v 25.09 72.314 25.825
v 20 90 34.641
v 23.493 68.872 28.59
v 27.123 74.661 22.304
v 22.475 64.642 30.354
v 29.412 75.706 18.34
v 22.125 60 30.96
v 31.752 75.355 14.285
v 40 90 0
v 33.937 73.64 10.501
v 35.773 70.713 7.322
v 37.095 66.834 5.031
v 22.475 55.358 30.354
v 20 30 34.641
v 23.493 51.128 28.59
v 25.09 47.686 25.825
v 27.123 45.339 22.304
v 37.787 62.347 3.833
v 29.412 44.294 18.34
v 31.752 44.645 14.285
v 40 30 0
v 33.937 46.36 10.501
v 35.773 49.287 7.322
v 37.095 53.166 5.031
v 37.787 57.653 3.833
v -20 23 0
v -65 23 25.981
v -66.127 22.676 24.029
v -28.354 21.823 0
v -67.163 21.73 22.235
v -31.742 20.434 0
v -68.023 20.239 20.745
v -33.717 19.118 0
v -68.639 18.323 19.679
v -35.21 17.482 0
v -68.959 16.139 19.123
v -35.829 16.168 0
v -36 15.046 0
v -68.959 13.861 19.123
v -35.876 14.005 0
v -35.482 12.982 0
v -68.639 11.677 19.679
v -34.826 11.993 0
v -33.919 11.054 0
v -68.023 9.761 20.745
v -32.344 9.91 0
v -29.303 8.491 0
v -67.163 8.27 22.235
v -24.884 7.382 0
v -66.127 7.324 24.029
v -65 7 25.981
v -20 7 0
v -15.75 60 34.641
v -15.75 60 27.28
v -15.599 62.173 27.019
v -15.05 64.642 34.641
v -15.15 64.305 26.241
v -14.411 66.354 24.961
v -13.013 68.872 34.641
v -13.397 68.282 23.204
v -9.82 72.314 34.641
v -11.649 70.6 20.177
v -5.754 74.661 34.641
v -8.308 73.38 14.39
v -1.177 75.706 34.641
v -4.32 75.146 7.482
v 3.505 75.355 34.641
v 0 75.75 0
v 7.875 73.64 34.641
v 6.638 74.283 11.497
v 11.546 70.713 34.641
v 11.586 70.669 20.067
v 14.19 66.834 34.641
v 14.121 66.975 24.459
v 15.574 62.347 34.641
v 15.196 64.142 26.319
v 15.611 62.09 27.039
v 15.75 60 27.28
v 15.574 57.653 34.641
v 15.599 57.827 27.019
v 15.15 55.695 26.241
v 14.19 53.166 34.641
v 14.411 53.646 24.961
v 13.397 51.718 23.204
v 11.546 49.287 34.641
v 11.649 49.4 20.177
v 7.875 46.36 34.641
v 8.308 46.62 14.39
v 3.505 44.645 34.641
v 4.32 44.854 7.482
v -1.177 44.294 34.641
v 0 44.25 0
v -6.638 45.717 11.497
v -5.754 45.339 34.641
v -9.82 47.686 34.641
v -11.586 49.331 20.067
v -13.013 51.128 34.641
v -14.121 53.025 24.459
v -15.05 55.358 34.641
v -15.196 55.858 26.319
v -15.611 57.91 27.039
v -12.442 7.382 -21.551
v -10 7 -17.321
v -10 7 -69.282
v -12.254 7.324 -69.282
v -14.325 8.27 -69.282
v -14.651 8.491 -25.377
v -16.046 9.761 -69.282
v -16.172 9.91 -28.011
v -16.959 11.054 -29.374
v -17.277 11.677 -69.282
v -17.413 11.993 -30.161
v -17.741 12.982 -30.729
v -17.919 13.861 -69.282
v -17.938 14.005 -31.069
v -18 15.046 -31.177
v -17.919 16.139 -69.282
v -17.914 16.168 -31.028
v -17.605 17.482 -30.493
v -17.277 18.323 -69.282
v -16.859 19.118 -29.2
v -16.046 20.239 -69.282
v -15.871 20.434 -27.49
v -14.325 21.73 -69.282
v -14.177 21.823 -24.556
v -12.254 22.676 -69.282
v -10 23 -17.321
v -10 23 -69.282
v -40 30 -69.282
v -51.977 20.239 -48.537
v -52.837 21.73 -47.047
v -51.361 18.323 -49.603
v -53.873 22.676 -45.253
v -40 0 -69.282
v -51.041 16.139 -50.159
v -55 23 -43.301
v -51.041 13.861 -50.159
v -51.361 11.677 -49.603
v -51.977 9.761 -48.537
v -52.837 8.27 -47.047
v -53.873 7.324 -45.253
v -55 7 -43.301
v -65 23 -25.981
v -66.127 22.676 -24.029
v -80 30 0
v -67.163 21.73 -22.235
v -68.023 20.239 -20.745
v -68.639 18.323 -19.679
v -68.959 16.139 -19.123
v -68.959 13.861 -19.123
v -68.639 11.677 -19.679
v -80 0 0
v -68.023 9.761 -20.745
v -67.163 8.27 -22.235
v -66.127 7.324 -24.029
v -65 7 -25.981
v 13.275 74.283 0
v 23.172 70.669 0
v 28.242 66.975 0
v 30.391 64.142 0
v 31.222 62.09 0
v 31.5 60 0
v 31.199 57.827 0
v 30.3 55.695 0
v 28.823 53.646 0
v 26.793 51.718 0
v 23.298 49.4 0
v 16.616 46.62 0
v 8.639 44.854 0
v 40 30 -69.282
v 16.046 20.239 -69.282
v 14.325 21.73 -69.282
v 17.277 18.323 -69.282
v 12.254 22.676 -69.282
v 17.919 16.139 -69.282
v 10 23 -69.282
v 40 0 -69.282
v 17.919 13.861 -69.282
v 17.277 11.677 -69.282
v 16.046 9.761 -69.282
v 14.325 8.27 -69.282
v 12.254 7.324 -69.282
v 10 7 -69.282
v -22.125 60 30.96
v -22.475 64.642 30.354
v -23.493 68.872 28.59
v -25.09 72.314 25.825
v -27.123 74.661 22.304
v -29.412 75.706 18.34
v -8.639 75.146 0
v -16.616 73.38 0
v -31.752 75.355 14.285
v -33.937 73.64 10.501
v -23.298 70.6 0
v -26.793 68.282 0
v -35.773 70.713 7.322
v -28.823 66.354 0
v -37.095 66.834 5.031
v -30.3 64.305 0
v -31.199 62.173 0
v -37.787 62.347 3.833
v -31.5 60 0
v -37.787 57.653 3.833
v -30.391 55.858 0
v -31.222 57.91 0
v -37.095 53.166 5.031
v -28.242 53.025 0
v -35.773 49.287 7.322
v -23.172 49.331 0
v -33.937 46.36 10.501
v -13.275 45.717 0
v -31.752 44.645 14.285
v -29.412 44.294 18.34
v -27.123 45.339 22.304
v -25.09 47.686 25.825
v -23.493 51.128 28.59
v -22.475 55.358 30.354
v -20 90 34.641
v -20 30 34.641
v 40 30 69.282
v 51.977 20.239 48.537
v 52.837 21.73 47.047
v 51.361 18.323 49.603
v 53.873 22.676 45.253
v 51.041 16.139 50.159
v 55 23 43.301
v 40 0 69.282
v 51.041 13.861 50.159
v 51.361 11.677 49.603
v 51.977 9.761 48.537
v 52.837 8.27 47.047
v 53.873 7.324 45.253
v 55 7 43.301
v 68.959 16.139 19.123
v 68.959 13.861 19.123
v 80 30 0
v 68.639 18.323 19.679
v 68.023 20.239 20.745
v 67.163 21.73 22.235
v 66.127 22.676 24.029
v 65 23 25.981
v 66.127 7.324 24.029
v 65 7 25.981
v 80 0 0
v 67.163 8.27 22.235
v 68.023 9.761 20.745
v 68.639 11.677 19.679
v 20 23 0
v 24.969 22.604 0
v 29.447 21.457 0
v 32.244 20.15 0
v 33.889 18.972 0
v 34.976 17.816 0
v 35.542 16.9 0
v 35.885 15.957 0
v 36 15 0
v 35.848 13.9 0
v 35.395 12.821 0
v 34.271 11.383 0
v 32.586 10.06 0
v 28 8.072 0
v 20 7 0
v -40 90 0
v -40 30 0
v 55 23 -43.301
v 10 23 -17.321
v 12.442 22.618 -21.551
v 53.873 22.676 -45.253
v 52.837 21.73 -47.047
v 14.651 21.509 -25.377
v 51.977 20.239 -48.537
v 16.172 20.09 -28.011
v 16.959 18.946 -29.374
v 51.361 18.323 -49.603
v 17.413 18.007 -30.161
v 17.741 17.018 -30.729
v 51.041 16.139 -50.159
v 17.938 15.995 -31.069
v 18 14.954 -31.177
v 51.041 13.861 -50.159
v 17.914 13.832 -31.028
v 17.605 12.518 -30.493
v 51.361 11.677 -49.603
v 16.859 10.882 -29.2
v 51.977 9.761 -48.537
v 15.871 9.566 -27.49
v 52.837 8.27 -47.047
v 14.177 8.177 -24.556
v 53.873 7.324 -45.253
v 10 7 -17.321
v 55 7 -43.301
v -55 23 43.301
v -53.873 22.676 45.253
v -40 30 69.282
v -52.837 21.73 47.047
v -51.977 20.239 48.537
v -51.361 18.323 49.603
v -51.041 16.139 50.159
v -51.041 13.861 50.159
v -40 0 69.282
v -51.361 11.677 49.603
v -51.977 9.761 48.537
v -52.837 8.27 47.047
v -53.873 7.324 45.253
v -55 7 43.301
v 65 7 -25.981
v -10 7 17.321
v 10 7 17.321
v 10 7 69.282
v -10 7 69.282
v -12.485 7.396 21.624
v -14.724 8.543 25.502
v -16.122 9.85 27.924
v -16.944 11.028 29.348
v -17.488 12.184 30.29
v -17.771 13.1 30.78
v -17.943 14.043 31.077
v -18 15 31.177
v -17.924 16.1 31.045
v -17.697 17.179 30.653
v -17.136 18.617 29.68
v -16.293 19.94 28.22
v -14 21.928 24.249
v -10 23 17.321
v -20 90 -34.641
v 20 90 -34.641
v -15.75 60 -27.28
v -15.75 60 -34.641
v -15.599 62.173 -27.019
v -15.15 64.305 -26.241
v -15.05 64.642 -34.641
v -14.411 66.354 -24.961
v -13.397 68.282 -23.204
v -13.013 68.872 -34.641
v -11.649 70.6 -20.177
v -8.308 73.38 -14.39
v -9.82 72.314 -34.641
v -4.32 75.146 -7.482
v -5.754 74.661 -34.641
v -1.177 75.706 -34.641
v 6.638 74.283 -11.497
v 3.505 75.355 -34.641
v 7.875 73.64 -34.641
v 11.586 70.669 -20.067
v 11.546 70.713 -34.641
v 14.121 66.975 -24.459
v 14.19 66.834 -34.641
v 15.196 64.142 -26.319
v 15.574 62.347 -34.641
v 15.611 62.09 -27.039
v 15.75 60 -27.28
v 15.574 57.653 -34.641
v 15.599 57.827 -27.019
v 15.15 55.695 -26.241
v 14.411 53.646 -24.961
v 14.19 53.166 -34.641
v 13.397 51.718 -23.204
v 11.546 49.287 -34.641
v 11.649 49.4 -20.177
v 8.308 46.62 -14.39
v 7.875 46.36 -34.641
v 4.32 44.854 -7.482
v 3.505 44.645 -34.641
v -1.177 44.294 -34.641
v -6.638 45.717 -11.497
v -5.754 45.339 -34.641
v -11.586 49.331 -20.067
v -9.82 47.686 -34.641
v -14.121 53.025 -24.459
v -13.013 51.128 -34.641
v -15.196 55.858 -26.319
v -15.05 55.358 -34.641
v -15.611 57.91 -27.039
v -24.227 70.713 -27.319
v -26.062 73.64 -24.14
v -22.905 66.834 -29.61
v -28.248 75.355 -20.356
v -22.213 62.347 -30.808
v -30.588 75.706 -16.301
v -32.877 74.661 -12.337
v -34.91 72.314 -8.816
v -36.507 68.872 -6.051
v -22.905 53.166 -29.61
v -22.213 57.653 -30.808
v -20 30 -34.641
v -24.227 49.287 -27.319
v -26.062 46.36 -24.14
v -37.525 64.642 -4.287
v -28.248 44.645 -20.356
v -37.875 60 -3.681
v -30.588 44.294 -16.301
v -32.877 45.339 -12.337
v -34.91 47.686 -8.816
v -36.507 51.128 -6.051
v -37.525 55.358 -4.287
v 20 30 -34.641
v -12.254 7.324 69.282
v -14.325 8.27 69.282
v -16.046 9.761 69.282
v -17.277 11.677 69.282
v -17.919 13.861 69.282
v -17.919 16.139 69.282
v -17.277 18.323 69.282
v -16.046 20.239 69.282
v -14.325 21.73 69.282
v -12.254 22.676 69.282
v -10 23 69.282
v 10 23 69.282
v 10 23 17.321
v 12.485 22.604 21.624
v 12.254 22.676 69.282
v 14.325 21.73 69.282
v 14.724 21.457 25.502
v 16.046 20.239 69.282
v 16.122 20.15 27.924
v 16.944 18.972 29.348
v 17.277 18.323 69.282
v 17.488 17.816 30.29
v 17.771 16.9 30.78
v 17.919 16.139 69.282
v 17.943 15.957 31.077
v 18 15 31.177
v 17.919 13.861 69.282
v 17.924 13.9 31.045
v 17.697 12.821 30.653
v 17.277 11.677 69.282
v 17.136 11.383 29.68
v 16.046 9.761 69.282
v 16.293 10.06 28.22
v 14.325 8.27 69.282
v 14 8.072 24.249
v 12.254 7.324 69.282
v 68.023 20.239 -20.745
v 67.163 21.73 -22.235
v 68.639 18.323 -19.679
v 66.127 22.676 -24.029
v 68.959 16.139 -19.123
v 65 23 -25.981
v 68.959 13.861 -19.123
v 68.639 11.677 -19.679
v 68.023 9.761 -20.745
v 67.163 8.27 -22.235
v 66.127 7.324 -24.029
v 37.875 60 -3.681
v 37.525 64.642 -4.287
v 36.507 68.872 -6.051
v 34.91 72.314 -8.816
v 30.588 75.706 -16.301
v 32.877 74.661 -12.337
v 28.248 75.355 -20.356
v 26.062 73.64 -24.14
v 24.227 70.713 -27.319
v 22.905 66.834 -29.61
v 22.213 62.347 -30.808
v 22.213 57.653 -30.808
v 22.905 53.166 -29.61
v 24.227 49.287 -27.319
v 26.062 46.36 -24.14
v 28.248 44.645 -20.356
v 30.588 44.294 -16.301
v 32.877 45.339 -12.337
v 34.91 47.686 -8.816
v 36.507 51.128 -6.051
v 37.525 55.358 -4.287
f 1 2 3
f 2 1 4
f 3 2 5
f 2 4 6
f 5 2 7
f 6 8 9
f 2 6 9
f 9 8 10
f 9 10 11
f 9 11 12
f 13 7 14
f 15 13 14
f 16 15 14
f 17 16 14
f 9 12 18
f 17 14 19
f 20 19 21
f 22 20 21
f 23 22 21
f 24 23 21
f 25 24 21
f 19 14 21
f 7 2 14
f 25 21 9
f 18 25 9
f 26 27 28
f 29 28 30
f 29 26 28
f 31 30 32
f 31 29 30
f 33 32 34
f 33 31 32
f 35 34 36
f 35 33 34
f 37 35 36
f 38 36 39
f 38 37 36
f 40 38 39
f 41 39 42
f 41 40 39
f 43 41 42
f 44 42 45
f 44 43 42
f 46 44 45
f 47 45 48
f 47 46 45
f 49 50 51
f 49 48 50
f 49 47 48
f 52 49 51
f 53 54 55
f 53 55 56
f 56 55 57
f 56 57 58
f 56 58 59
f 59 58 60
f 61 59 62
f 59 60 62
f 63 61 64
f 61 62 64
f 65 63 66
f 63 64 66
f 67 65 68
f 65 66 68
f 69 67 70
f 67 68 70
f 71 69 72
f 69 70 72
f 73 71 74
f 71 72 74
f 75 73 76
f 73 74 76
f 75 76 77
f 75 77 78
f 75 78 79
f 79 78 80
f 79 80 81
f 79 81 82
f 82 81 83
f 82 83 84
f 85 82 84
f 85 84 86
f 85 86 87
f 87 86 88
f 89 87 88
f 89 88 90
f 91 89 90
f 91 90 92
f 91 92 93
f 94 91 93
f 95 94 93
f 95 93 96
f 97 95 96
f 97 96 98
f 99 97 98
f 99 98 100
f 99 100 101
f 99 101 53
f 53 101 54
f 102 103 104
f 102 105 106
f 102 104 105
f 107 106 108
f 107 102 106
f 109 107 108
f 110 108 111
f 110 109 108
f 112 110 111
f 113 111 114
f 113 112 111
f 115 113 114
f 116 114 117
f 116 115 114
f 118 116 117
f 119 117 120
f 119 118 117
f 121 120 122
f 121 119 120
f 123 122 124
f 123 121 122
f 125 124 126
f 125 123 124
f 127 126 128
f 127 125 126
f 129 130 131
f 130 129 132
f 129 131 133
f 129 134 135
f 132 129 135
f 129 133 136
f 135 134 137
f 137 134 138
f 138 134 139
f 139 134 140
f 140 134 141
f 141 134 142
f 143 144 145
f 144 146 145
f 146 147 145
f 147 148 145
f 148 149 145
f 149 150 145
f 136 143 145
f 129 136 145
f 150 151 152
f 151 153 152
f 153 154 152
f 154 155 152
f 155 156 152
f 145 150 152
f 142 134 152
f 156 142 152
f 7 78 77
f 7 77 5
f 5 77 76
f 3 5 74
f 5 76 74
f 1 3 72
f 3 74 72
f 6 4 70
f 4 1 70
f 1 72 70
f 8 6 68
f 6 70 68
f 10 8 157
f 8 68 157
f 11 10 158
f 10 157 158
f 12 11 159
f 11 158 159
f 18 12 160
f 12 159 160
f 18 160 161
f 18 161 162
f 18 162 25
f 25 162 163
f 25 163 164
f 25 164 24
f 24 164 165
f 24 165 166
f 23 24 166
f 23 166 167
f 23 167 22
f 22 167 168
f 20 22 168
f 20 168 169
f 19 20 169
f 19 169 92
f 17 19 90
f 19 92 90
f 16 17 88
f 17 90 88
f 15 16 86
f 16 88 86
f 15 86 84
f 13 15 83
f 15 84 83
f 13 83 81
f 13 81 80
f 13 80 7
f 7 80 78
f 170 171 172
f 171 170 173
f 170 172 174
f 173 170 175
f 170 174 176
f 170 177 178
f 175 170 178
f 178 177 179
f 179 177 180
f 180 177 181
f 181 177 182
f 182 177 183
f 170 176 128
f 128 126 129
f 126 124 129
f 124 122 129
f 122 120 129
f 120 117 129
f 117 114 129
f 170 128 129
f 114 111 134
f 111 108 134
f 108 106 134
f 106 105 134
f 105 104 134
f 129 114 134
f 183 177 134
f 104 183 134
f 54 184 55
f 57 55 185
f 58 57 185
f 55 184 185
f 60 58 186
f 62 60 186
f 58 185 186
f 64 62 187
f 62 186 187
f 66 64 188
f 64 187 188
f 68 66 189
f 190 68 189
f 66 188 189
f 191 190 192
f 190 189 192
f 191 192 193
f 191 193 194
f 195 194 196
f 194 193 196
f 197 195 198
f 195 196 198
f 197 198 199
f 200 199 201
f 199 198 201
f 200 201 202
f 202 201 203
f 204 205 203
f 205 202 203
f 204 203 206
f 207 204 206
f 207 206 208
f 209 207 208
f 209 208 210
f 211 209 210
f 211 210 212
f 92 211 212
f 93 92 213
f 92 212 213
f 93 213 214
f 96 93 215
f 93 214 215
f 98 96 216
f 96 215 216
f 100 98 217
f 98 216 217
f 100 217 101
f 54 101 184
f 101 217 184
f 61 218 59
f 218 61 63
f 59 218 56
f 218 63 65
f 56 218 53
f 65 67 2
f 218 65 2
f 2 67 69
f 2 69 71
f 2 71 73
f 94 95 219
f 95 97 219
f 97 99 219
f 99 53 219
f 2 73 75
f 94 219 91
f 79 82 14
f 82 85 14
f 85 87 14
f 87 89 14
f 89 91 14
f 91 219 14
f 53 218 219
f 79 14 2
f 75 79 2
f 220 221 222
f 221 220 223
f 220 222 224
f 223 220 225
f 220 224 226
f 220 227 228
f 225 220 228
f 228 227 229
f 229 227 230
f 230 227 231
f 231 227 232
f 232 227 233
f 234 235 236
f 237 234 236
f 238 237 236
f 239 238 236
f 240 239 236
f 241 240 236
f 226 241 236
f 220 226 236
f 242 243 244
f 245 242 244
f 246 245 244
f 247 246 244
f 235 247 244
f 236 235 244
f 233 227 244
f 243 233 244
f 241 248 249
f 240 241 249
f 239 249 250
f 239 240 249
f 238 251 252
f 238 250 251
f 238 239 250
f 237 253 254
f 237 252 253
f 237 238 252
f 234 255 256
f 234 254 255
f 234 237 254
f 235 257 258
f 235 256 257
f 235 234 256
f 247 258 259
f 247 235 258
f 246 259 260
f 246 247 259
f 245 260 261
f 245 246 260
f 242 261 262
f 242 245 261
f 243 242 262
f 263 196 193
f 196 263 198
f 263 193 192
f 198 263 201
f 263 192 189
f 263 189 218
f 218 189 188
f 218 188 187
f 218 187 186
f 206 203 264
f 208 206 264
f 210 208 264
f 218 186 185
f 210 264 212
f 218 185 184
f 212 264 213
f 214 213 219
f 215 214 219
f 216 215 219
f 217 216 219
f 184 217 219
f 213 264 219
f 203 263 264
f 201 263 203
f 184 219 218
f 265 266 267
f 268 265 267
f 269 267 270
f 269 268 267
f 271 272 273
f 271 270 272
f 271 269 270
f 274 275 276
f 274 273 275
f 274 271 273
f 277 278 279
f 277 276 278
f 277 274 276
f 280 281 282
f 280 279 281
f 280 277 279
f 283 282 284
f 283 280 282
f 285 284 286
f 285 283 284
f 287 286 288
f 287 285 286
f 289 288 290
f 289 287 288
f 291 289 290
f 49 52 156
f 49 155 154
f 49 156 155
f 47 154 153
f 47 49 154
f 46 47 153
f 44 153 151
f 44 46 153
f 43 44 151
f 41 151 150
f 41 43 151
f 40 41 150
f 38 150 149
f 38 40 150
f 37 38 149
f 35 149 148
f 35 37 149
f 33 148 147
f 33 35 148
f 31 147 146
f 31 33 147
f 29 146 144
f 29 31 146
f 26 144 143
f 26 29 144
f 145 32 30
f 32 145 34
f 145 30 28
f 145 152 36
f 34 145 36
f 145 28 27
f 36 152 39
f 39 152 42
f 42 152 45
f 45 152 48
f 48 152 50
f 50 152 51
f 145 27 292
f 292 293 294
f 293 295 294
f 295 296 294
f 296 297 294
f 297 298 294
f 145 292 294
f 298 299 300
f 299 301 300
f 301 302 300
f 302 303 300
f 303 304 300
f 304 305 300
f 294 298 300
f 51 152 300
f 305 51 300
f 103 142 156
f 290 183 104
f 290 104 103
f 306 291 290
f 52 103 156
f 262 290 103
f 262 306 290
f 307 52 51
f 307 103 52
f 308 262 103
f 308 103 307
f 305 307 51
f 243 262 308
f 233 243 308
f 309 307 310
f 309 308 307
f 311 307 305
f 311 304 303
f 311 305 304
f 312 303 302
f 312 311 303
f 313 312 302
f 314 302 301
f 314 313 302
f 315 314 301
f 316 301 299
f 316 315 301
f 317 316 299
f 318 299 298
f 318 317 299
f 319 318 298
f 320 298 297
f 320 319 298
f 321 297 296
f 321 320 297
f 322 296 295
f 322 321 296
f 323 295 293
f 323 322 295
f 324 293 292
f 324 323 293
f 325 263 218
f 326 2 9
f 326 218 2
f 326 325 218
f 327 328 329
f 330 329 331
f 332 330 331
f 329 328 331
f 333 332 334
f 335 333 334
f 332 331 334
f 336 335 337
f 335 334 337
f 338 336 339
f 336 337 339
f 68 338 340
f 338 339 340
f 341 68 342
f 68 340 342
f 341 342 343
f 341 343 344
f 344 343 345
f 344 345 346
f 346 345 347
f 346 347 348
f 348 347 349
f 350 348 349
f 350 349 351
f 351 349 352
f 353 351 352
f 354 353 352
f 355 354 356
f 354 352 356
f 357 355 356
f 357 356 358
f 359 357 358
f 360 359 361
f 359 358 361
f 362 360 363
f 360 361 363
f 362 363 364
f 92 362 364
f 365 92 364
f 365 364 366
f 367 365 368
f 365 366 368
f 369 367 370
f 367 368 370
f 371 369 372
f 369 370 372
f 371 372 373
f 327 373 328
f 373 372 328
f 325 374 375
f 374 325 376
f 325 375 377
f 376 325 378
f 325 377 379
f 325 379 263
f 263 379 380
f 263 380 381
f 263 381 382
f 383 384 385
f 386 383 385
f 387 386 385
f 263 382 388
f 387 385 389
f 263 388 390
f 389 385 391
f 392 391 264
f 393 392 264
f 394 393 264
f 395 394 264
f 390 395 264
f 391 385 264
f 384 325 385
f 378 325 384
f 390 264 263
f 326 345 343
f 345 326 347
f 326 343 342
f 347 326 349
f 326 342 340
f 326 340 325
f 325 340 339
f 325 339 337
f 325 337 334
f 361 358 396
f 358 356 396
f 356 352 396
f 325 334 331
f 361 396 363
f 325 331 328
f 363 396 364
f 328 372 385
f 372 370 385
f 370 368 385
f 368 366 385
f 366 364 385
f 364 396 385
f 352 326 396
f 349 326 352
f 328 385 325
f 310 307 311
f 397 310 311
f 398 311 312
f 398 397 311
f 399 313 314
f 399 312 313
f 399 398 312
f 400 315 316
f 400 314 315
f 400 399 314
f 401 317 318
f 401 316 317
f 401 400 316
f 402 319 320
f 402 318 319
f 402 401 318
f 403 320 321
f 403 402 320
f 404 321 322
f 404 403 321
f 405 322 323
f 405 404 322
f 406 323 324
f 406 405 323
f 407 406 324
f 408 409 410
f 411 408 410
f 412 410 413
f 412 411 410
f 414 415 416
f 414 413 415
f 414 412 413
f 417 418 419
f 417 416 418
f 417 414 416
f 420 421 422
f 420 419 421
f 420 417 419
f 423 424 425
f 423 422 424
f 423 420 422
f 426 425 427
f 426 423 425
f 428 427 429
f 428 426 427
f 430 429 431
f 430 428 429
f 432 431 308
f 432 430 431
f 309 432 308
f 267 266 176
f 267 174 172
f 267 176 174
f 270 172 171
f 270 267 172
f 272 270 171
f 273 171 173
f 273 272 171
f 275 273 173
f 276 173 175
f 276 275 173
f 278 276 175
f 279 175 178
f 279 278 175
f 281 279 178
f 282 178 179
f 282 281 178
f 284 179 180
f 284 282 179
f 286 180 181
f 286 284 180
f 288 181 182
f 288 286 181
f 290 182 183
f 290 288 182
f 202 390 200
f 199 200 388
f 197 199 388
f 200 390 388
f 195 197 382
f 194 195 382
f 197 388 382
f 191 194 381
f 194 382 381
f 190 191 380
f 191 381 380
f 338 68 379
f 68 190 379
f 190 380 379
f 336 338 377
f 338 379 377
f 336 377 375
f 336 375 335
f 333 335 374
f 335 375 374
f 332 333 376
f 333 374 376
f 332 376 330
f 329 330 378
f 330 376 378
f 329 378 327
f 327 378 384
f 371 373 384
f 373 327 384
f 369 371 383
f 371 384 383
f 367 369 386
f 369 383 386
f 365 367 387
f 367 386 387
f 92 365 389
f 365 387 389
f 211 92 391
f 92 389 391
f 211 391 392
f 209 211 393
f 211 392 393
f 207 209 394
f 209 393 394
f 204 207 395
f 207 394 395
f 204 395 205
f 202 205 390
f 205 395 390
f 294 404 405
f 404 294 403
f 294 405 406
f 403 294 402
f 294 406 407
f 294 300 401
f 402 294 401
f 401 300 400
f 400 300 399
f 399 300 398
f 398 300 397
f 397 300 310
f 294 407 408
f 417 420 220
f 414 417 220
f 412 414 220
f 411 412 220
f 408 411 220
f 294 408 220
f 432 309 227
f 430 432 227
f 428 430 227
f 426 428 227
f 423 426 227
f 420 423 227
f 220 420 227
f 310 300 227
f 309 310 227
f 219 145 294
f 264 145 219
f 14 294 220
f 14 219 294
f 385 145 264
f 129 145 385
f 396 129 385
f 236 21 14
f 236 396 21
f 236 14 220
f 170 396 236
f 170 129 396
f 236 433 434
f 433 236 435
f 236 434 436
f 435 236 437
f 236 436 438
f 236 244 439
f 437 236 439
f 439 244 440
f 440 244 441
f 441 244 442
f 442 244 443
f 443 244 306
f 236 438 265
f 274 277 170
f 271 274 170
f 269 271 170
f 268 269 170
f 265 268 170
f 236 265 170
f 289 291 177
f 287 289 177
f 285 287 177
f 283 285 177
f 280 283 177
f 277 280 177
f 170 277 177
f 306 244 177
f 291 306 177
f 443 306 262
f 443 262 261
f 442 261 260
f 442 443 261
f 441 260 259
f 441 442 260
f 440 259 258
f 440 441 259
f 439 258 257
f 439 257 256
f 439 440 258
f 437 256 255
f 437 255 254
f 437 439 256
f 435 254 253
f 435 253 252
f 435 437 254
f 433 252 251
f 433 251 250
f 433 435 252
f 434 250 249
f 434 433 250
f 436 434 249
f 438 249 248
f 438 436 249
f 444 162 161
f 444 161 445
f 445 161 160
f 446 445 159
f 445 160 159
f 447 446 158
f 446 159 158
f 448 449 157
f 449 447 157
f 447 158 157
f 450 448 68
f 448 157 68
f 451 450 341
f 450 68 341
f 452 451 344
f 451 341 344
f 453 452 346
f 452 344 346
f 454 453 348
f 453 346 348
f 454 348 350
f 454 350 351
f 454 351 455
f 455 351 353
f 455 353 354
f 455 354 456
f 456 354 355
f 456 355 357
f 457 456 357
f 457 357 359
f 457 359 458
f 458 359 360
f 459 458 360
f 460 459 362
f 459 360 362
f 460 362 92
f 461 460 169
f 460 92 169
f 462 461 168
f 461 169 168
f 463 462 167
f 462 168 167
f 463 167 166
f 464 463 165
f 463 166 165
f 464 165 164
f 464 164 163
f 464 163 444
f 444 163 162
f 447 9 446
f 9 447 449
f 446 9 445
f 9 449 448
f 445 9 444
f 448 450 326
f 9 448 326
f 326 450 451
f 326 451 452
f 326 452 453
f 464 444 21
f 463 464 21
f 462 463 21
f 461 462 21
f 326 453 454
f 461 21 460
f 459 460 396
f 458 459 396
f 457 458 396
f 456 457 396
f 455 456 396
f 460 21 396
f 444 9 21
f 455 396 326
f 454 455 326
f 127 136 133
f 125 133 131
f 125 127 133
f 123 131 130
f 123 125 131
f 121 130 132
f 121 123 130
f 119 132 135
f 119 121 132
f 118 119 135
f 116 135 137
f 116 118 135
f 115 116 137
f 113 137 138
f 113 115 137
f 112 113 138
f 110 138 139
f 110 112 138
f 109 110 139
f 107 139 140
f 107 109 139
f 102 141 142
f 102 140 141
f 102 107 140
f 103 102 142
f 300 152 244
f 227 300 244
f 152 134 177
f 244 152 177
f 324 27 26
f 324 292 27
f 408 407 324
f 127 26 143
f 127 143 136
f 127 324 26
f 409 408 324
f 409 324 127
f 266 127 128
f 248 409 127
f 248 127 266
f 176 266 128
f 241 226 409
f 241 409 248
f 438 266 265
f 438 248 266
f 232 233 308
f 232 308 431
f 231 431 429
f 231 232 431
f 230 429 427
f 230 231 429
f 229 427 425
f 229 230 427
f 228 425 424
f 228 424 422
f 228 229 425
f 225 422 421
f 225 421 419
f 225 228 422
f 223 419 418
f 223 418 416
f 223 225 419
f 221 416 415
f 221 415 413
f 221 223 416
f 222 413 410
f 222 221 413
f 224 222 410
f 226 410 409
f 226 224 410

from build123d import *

# Parameters (mm, degrees)
BOSS_EXTRUDE1_DEPTH = 30
BOSS_EXTRUDE2_DEPTH = 60
HOLE1_D             = 31.5
CIRPATTERN2_COUNT   = 6
CUT_EXTRUDE1_DEPTH  = 184.575597507
CIRPATTERN3_COUNT   = 6


with BuildPart() as part:
    # Sketch1 → Boss-Extrude1 (new body)
    with BuildSketch(Plane(origin=(0, 0, 0), x_dir=(1, 0, 0), z_dir=(0, 1, 0))):
        Polygon((40, -69.282032303), (80, 0), (40, 69.282032303), (-40, 69.282032303), (-80, 0), (-40, -69.282032303), align=None)
    extrude(amount=BOSS_EXTRUDE1_DEPTH)

    # Sketch2 → Boss-Extrude2 (add)
    with BuildSketch(Plane(origin=(0, 30, 0), x_dir=(1, 0, 0), z_dir=(0, 1, 0))):
        Polygon((20, -34.641016151), (40, 0), (20, 34.641016151), (-20, 34.641016151), (-40, 0), (-20, -34.641016151), align=None)
    extrude(amount=BOSS_EXTRUDE2_DEPTH)

    # Hole1 (through all)
    with Locations(Plane.XY.offset(34.641016151)):
        with Locations((0, 60)):
            hole1 = Hole(HOLE1_D / 2)

    # CirPattern2: Hole1 ×6 about axis
    cirpattern2_axis = Axis((0, 90, 0), (0, 1, 0))
    for i in range(1, CIRPATTERN2_COUNT):
        add(hole1.rotate(cirpattern2_axis, i * 360 / CIRPATTERN2_COUNT), mode=Mode.SUBTRACT)

    # Sketch5 → Cut-Extrude1 (cut, symmetric)
    with BuildSketch(Plane.XY.offset(69.282032303)):
        with BuildLine():
            Line((-10, 23), (10, 23))
            ThreePointArc((10, 23), (18, 15), (10, 7))
            Line((10, 7), (-10, 7))
            ThreePointArc((-10, 7), (-18, 15), (-10, 23))
        make_face()
    cut_extrude1 = extrude(amount=CUT_EXTRUDE1_DEPTH, both=True, mode=Mode.SUBTRACT)

    # CirPattern3: Cut-Extrude1 ×6 about axis
    cirpattern3_axis = Axis((0, 90, 0), (0, 1, 0))
    for i in range(1, CIRPATTERN3_COUNT):
        add(cut_extrude1.rotate(cirpattern3_axis, i * 360 / CIRPATTERN3_COUNT), mode=Mode.SUBTRACT)


solid = part.part
